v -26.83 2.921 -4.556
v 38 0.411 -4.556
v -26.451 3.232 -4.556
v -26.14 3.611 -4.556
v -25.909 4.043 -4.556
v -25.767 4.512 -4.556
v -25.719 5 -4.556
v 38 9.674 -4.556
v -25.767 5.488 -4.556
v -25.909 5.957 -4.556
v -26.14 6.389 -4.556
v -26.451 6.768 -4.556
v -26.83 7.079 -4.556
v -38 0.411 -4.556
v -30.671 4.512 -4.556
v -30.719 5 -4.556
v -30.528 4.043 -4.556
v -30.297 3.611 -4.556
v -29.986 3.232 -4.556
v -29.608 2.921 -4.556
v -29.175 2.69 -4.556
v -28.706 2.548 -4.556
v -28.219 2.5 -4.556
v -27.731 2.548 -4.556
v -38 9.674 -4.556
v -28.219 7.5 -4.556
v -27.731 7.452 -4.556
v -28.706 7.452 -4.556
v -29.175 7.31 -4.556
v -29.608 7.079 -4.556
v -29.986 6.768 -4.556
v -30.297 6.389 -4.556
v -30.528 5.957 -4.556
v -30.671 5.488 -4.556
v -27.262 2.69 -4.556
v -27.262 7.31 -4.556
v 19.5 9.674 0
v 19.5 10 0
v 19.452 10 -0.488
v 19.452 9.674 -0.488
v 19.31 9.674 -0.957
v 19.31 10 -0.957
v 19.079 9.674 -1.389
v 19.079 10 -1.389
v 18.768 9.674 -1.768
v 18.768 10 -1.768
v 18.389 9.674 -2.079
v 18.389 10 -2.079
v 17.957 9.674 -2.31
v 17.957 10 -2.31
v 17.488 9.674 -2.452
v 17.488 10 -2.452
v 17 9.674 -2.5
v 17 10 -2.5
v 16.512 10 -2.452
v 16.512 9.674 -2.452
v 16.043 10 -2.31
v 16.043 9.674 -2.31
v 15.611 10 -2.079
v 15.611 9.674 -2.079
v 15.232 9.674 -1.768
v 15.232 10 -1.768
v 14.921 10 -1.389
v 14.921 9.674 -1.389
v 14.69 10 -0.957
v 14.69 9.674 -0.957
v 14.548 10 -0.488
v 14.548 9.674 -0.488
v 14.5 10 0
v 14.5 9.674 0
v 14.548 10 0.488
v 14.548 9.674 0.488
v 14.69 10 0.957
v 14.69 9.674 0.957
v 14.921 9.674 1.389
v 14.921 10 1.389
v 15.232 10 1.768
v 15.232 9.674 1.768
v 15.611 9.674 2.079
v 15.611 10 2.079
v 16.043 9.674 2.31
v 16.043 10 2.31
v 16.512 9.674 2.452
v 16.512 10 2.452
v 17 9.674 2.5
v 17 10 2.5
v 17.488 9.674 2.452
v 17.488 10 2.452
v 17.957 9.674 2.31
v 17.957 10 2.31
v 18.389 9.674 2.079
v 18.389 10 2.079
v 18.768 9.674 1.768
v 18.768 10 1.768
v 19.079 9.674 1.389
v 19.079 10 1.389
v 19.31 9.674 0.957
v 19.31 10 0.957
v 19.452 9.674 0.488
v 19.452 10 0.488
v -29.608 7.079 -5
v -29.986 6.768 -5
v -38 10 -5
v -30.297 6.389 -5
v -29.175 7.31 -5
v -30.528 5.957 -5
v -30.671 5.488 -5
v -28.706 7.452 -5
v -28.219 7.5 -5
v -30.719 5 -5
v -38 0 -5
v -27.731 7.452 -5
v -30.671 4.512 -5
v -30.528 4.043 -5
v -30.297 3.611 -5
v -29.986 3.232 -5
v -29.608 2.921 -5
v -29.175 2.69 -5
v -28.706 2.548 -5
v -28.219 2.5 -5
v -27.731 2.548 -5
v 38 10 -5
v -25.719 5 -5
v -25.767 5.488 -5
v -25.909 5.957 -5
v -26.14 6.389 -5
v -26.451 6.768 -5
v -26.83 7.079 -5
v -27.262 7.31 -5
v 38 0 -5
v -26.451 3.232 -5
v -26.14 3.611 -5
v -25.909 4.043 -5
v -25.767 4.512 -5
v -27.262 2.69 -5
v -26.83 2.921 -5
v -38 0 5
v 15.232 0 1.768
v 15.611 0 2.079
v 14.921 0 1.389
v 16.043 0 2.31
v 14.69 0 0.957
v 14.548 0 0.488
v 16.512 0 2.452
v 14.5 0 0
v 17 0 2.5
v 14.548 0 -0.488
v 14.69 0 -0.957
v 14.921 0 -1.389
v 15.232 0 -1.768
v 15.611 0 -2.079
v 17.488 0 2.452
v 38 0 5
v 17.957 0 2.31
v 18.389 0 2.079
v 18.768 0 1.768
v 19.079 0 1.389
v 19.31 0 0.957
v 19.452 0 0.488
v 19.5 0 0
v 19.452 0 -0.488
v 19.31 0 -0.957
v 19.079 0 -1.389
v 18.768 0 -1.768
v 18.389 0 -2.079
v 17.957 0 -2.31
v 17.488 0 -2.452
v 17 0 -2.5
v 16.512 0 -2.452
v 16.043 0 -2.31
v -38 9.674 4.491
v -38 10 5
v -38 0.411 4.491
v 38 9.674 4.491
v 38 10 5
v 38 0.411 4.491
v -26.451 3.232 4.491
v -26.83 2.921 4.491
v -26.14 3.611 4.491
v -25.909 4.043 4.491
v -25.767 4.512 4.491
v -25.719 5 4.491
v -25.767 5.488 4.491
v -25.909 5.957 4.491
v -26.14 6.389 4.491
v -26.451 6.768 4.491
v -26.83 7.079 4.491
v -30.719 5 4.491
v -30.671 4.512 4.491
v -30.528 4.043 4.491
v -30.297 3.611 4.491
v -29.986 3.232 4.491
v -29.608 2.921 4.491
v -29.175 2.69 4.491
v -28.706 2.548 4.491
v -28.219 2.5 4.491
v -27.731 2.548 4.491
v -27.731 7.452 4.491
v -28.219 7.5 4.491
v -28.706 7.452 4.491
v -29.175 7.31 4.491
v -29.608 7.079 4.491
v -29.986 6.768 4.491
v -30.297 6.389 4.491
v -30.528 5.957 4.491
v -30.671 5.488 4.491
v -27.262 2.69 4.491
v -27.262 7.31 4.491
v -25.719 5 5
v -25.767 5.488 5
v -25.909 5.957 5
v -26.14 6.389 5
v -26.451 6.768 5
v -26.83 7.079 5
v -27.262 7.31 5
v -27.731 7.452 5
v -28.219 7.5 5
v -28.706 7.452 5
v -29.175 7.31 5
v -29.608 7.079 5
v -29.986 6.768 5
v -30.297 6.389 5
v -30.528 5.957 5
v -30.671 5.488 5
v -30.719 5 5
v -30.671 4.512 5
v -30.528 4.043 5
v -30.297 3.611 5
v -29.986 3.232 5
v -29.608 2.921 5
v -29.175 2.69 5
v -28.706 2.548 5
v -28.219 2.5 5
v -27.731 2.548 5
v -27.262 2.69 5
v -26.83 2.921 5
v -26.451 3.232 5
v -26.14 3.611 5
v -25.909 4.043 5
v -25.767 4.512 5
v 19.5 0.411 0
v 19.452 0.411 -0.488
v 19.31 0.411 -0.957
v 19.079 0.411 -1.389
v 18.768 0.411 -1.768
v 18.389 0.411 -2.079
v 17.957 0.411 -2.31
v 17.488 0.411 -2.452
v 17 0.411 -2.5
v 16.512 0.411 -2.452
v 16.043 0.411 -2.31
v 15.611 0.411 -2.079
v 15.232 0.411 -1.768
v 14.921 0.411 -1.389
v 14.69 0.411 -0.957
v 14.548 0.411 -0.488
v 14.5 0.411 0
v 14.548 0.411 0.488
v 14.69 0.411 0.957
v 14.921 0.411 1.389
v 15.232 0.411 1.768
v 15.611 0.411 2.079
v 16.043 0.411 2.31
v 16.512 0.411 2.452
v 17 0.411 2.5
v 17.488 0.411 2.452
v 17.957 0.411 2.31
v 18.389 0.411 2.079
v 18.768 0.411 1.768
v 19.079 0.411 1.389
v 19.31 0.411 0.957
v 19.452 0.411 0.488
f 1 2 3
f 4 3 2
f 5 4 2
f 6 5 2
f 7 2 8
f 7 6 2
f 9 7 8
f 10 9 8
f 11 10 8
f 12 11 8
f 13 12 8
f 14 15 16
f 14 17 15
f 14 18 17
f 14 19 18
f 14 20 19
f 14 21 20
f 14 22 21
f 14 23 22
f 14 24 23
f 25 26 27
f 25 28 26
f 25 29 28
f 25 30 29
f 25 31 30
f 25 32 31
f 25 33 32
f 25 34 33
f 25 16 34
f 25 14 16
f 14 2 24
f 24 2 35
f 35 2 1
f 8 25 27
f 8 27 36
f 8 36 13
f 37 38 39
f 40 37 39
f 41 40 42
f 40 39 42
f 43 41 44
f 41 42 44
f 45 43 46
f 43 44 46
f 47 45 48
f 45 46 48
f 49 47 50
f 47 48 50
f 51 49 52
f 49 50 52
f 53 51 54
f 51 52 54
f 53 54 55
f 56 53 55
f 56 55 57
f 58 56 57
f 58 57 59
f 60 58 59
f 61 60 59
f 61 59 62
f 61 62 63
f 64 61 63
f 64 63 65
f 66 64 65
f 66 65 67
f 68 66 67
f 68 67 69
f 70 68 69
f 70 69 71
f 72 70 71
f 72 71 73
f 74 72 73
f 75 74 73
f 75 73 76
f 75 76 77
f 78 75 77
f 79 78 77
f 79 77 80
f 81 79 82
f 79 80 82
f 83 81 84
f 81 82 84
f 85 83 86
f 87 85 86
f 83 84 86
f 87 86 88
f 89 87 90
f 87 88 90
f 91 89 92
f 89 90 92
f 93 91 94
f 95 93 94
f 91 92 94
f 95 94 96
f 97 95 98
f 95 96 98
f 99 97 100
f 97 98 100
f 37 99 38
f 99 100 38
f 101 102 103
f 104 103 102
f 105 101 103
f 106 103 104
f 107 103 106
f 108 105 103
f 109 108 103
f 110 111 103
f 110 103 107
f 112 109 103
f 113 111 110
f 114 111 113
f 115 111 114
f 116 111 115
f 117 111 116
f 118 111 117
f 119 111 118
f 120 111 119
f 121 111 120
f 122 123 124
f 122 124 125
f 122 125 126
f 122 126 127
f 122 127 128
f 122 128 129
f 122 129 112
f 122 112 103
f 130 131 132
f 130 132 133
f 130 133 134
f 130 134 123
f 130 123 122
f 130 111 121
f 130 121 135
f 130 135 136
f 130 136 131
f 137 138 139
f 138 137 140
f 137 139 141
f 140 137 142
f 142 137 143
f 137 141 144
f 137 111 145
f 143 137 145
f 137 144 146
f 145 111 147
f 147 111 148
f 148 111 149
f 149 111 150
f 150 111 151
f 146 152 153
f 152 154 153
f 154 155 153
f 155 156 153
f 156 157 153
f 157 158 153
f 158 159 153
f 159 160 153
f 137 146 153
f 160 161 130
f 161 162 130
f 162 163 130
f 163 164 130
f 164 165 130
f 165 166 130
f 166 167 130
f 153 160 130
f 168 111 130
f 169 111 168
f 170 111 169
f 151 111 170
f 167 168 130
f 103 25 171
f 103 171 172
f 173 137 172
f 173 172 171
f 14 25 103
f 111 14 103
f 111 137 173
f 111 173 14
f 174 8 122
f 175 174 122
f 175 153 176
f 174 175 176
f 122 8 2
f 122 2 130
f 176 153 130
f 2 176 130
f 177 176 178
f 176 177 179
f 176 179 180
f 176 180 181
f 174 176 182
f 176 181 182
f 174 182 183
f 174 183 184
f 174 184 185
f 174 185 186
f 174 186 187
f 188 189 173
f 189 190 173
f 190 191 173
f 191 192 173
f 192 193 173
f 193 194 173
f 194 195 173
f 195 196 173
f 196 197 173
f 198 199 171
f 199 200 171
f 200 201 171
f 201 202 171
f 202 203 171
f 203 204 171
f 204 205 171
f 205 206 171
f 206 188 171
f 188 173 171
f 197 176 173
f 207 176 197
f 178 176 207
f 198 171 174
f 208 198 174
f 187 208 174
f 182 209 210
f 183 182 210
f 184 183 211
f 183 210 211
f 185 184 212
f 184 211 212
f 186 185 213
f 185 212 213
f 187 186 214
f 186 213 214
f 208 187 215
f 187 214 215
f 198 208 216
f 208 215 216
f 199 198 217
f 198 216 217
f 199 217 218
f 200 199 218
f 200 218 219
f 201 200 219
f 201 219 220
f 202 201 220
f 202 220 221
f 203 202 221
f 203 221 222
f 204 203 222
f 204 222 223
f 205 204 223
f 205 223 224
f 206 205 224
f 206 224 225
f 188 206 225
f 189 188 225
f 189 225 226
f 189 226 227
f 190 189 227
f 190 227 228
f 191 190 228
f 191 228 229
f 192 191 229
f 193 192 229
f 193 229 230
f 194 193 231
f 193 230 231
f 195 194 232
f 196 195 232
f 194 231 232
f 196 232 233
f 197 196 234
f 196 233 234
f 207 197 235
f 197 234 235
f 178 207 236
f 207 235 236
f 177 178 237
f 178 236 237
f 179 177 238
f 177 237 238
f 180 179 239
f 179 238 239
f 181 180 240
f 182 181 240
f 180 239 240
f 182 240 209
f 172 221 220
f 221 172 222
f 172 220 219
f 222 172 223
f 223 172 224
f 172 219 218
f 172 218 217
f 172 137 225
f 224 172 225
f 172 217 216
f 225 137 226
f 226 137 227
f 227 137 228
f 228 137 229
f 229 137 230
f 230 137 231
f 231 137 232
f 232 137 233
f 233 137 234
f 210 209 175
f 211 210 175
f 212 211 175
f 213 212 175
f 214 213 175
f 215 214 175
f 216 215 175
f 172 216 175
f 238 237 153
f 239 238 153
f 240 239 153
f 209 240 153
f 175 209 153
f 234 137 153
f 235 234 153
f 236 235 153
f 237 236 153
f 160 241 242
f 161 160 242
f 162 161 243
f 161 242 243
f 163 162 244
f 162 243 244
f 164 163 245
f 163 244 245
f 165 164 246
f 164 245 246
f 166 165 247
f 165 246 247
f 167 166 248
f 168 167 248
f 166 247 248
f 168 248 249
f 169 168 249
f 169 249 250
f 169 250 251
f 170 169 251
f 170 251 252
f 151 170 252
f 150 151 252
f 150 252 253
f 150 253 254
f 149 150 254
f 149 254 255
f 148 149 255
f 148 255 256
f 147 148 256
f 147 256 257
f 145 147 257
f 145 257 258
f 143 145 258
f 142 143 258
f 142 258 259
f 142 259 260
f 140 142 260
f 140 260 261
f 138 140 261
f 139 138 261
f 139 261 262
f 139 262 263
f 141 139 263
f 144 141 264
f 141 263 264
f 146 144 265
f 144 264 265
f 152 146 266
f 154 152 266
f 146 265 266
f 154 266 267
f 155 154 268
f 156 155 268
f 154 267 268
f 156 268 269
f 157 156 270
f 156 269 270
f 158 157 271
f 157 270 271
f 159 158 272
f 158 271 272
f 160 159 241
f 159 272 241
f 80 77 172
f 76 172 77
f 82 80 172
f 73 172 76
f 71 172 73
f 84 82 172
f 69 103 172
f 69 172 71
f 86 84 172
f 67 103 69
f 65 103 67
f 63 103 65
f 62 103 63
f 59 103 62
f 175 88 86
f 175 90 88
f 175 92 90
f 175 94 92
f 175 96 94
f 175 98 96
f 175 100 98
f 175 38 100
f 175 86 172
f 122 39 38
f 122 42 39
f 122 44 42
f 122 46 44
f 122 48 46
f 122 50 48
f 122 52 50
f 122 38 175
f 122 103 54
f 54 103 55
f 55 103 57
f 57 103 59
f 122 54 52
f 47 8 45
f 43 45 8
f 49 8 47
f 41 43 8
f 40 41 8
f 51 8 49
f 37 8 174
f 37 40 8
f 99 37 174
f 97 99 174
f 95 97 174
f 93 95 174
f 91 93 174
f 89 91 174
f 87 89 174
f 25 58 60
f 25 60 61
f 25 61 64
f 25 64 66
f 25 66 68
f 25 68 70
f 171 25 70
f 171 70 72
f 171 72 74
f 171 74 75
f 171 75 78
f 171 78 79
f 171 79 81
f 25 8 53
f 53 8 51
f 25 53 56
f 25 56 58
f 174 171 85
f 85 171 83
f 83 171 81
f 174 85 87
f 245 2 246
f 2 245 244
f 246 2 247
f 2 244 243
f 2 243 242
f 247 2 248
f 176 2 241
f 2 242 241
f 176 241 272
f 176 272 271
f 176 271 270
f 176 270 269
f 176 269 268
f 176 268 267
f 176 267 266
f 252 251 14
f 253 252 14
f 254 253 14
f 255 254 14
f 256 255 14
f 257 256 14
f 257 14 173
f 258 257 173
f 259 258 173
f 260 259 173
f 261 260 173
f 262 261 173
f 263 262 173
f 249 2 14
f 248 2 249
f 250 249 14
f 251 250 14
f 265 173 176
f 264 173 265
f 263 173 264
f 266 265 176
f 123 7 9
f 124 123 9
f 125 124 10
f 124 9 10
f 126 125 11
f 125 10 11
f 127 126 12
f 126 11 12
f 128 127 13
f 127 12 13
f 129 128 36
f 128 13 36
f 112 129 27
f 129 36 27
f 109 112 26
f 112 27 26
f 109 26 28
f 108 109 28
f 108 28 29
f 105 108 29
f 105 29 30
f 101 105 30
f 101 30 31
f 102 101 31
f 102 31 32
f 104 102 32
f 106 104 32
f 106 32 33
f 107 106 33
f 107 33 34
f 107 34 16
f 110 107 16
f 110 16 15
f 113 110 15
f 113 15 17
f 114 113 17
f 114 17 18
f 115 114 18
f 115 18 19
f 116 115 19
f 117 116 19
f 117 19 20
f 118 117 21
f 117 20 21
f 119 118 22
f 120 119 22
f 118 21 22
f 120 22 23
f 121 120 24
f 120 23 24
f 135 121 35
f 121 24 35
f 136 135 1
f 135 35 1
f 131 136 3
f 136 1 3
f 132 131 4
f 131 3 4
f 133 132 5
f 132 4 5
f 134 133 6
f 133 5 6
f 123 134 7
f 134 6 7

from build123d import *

# Parameters (mm, degrees)
SKETCH1_W           = 76
SKETCH1_H           = 10
BOSS_EXTRUDE1_DEPTH = 10
SKETCH2_W           = 9.046482833
SKETCH2_H           = 9.263922883
CUT_EXTRUDE1_DEPTH  = 77
SKETCH4_R           = 2.5
CUT_EXTRUDE2_DEPTH  = 76
SKETCH6_R           = 2.5
CUT_EXTRUDE3_DEPTH  = 76


with BuildPart() as part:
    # Sketch1 → Boss-Extrude1 (new body)
    with BuildSketch(Plane(origin=(0, 0, 0), x_dir=(1, 0, 0), z_dir=(0, 1, 0))):
        Rectangle(SKETCH1_W, SKETCH1_H)
    extrude(amount=BOSS_EXTRUDE1_DEPTH)

    # Sketch2 → Cut-Extrude1 (cut, through all)
    with BuildSketch(Plane.ZY.offset(38)):
        with Locations((-0.032492444, 5.042490422)):
            Rectangle(SKETCH2_W, SKETCH2_H)
    extrude(amount=-CUT_EXTRUDE1_DEPTH, mode=Mode.SUBTRACT)

    # Sketch4 → Cut-Extrude2 (cut)
    with BuildSketch(Plane.XY.offset(5)):
        with Locations((-28.218728934, 5)):
            Circle(SKETCH4_R)
    extrude(amount=-CUT_EXTRUDE2_DEPTH, mode=Mode.SUBTRACT)

    # Sketch6 → Cut-Extrude3 (cut)
    with BuildSketch(Plane(origin=(0, 10, 0), x_dir=(1, 0, 0), z_dir=(0, 1, 0))):
        with Locations((17, 0)):
            Circle(SKETCH6_R)
    extrude(amount=-CUT_EXTRUDE3_DEPTH, mode=Mode.SUBTRACT)


solid = part.part
